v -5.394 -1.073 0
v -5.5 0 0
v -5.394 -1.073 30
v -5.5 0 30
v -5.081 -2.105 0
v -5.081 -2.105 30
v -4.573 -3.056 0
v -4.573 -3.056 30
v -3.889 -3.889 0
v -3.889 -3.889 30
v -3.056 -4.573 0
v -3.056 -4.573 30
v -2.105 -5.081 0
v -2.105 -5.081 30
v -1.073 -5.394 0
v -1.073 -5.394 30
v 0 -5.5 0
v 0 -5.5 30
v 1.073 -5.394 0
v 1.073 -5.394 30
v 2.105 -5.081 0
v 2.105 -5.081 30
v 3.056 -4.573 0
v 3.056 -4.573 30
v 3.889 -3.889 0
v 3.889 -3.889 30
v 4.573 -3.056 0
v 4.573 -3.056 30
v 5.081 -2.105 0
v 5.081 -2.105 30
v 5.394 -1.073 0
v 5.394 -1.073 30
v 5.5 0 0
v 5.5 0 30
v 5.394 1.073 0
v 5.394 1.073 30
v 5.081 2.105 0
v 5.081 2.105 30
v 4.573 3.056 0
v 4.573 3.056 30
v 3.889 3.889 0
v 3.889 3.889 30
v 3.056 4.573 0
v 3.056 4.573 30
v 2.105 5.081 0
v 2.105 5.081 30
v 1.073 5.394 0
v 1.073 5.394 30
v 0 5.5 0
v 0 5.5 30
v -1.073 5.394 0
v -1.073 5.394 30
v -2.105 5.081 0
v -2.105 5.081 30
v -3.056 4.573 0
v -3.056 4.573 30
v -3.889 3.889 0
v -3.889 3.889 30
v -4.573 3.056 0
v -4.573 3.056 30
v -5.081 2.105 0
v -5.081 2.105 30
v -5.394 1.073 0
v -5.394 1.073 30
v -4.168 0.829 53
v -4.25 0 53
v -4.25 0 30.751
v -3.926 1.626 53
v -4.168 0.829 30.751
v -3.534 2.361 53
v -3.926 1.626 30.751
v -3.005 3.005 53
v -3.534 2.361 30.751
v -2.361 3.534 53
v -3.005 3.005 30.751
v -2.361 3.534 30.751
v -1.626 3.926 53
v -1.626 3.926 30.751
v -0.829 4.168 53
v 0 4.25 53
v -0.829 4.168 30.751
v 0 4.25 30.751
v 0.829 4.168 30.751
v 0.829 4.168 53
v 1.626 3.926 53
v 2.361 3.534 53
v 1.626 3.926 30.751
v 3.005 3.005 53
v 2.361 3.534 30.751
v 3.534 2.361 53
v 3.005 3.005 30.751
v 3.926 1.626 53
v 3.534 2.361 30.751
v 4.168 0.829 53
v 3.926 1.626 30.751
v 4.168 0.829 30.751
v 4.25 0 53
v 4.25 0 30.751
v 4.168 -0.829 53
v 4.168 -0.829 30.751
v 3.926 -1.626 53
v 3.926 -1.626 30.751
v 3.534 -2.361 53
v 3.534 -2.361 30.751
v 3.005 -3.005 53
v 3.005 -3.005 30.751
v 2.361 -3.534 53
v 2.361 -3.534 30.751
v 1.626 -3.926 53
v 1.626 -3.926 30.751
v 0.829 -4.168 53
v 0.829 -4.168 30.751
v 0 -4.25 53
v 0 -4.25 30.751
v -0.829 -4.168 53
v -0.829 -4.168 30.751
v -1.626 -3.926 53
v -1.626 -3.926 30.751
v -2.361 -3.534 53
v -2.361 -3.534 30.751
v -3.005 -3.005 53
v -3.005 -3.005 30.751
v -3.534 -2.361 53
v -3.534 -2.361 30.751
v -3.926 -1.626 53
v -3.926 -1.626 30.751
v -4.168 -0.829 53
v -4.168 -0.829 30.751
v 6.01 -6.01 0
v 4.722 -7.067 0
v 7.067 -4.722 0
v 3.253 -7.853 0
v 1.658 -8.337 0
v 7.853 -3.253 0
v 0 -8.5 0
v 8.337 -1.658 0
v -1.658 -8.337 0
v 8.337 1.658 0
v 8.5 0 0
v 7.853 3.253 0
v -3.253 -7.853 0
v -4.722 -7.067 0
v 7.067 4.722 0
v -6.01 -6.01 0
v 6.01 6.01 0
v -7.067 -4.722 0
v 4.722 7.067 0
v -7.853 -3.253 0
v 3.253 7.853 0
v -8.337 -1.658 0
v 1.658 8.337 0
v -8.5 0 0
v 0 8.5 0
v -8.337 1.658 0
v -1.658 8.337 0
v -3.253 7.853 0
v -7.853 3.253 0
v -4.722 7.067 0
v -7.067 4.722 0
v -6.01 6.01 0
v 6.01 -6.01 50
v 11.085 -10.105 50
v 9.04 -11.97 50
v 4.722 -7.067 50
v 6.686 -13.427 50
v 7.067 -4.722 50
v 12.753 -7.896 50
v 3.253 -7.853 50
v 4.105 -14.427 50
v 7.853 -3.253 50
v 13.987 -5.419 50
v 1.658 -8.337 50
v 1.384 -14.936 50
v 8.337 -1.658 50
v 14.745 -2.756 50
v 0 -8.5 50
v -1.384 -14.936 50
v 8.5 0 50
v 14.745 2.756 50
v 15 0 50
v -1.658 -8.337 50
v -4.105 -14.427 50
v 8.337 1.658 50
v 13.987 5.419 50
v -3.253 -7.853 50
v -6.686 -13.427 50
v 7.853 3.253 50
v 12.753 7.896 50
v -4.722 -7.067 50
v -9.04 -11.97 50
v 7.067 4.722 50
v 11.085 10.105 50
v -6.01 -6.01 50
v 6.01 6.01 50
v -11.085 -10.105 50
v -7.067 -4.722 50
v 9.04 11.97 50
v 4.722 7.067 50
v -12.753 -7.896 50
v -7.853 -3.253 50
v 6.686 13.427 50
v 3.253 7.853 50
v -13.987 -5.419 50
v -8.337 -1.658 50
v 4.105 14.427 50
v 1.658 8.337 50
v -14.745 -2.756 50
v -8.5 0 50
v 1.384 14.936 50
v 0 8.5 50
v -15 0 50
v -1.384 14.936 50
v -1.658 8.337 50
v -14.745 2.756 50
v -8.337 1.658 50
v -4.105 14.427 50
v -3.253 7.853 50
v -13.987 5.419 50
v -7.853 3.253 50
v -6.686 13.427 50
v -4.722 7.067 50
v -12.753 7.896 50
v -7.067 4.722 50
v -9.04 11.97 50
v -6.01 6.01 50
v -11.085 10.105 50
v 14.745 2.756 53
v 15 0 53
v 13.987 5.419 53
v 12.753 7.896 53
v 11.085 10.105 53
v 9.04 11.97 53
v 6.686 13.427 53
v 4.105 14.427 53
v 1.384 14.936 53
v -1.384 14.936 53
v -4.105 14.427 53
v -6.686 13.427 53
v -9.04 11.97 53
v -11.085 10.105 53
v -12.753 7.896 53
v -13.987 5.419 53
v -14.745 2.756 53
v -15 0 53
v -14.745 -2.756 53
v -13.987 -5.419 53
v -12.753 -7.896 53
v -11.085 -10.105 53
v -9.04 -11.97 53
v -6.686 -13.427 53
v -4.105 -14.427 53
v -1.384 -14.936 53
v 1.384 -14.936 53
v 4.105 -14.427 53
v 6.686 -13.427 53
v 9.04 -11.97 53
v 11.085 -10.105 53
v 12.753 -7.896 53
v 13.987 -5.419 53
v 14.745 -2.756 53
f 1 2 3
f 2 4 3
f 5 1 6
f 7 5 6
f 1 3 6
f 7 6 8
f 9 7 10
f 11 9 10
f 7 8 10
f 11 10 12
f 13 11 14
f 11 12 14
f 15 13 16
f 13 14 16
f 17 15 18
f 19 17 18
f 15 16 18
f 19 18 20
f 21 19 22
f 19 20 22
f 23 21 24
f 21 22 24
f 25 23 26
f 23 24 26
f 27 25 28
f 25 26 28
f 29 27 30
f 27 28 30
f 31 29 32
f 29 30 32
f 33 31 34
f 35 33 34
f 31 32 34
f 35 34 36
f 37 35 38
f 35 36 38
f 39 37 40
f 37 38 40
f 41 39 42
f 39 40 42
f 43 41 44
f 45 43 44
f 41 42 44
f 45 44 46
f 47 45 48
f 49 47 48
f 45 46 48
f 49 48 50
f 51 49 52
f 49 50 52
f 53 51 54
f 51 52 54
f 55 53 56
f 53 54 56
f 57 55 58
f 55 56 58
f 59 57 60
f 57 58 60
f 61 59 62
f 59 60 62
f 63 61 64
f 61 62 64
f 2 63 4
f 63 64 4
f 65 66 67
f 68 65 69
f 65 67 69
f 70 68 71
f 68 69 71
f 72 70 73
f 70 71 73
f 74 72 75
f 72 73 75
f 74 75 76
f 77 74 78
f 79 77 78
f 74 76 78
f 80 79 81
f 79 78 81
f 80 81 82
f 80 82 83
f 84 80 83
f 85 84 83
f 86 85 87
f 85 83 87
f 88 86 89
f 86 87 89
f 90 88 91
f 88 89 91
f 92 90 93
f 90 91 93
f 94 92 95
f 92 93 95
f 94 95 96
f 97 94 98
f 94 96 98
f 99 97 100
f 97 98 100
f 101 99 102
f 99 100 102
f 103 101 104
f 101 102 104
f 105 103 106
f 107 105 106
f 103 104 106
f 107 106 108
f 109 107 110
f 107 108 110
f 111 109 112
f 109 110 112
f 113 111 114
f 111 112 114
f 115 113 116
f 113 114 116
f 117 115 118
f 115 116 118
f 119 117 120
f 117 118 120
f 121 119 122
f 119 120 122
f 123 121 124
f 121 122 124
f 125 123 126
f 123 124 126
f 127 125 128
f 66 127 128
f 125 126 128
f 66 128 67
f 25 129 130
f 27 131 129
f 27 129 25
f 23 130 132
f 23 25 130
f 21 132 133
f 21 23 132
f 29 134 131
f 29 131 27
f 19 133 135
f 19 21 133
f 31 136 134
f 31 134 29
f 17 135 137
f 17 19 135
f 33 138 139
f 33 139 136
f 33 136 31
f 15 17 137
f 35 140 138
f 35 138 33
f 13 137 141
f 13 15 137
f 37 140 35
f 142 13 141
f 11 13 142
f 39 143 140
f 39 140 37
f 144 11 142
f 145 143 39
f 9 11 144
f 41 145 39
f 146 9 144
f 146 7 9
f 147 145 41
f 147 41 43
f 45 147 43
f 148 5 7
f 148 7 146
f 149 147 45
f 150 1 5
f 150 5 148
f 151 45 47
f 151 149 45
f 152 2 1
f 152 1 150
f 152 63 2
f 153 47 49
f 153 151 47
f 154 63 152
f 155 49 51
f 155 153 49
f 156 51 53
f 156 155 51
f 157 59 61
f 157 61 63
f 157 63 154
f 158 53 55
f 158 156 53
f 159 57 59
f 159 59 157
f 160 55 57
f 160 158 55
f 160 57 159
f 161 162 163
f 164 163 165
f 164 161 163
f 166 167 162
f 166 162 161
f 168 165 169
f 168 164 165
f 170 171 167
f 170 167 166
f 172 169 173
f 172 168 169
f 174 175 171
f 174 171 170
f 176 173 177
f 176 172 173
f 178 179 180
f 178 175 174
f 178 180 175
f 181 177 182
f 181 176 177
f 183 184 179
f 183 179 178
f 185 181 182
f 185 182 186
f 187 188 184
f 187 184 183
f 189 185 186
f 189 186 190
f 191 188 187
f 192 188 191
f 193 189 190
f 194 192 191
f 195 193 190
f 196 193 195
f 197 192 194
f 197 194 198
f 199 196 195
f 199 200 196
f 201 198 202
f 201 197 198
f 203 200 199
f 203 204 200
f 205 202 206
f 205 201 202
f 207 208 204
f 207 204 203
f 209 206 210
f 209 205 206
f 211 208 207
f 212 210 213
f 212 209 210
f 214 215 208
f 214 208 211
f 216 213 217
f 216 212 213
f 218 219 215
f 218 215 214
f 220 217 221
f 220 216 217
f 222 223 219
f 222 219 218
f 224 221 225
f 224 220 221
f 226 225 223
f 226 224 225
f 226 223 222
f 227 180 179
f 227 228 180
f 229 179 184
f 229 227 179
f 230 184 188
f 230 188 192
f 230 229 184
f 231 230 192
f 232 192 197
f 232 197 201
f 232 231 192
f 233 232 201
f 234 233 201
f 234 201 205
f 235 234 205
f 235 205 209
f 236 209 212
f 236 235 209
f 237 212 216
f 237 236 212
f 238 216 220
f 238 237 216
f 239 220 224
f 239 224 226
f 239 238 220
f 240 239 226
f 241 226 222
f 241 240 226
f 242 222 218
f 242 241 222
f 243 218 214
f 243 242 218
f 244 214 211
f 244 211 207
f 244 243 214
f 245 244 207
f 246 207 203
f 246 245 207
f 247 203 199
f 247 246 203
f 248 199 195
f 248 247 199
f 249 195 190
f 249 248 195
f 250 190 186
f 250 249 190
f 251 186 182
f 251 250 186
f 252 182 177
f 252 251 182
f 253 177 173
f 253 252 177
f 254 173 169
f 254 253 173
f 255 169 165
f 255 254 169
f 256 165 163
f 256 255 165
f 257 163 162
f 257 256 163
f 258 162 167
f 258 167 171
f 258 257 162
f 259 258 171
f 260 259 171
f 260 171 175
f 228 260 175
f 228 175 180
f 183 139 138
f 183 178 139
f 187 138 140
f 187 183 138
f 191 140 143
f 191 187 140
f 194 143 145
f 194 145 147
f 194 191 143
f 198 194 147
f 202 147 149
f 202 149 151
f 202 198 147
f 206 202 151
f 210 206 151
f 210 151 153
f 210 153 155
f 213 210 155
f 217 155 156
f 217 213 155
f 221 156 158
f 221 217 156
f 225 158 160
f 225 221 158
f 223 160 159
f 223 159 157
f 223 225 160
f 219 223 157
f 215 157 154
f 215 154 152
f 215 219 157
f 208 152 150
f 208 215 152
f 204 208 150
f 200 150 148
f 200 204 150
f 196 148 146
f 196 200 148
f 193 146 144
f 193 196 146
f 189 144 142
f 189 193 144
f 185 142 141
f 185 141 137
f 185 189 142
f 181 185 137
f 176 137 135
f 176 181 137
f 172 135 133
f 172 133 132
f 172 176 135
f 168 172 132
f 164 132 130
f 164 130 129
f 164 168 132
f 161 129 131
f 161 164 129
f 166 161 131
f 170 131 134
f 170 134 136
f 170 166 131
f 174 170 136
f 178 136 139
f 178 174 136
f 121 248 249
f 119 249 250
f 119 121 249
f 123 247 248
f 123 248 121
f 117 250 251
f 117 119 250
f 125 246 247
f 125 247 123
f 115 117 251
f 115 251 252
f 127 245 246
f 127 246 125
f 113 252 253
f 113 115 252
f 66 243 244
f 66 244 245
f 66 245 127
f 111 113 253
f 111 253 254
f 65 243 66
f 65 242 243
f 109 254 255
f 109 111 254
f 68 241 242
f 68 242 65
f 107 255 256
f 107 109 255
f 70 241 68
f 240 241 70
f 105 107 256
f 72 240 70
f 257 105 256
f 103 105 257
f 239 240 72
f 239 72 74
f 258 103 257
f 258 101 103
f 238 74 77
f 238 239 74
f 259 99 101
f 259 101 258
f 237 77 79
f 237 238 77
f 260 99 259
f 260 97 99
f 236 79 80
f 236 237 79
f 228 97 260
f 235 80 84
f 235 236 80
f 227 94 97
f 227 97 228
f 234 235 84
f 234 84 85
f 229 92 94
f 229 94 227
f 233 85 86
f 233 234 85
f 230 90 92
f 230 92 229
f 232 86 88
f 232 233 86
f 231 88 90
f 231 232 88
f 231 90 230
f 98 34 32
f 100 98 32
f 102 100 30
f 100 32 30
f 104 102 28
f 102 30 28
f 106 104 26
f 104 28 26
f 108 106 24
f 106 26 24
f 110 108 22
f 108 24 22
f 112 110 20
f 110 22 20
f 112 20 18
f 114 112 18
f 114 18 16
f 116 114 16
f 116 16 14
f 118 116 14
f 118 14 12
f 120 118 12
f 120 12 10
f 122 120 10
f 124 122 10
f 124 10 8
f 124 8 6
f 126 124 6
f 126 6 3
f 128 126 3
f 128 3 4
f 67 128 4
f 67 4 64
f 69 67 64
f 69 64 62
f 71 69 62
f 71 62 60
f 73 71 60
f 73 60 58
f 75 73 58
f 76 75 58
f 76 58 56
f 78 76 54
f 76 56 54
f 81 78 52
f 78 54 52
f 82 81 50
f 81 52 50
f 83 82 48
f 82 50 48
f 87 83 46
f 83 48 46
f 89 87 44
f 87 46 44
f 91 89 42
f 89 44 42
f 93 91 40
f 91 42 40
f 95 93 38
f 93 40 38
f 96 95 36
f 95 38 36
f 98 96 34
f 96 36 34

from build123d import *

# Parameters (mm, degrees)
F3_D     = 8.5
F3_DEPTH = 25
F3_TIP   = 2.5536576309
F5_D     = 11
F5_DEPTH = 30
F5_TIP   = 3.3047334047


with BuildPart() as f1:
    # F0 (on Front) → F1 (revolve)
    with BuildSketch(Plane.XZ):
        Polygon((0, 53), (0, 0), (8.5, 0), (8.5, 50), (15, 50), (15, 53), align=None)
    revolve(axis=Axis((0, 0, 35.806838423), (0, 0, 1)))

    # F3
    with Locations(Plane.XY.offset(53)):
        with Locations((0, 0)):
            Hole(F3_D / 2, depth=F3_DEPTH)
            with Locations((0, 0, -(F3_DEPTH + F3_TIP / 2))):  # 118° drill point
                Cone(0, F3_D / 2, F3_TIP, mode=Mode.SUBTRACT)

    # F5
    with Locations(Plane(origin=(0, 0, 0), x_dir=(1, 0, 0), z_dir=(0, 0, -1))):
        with Locations((0, 0)):
            Hole(F5_D / 2, depth=F5_DEPTH)
            with Locations((0, 0, -(F5_DEPTH + F5_TIP / 2))):  # 118° drill point
                Cone(0, F5_D / 2, F5_TIP, mode=Mode.SUBTRACT)


solid = f1.part
